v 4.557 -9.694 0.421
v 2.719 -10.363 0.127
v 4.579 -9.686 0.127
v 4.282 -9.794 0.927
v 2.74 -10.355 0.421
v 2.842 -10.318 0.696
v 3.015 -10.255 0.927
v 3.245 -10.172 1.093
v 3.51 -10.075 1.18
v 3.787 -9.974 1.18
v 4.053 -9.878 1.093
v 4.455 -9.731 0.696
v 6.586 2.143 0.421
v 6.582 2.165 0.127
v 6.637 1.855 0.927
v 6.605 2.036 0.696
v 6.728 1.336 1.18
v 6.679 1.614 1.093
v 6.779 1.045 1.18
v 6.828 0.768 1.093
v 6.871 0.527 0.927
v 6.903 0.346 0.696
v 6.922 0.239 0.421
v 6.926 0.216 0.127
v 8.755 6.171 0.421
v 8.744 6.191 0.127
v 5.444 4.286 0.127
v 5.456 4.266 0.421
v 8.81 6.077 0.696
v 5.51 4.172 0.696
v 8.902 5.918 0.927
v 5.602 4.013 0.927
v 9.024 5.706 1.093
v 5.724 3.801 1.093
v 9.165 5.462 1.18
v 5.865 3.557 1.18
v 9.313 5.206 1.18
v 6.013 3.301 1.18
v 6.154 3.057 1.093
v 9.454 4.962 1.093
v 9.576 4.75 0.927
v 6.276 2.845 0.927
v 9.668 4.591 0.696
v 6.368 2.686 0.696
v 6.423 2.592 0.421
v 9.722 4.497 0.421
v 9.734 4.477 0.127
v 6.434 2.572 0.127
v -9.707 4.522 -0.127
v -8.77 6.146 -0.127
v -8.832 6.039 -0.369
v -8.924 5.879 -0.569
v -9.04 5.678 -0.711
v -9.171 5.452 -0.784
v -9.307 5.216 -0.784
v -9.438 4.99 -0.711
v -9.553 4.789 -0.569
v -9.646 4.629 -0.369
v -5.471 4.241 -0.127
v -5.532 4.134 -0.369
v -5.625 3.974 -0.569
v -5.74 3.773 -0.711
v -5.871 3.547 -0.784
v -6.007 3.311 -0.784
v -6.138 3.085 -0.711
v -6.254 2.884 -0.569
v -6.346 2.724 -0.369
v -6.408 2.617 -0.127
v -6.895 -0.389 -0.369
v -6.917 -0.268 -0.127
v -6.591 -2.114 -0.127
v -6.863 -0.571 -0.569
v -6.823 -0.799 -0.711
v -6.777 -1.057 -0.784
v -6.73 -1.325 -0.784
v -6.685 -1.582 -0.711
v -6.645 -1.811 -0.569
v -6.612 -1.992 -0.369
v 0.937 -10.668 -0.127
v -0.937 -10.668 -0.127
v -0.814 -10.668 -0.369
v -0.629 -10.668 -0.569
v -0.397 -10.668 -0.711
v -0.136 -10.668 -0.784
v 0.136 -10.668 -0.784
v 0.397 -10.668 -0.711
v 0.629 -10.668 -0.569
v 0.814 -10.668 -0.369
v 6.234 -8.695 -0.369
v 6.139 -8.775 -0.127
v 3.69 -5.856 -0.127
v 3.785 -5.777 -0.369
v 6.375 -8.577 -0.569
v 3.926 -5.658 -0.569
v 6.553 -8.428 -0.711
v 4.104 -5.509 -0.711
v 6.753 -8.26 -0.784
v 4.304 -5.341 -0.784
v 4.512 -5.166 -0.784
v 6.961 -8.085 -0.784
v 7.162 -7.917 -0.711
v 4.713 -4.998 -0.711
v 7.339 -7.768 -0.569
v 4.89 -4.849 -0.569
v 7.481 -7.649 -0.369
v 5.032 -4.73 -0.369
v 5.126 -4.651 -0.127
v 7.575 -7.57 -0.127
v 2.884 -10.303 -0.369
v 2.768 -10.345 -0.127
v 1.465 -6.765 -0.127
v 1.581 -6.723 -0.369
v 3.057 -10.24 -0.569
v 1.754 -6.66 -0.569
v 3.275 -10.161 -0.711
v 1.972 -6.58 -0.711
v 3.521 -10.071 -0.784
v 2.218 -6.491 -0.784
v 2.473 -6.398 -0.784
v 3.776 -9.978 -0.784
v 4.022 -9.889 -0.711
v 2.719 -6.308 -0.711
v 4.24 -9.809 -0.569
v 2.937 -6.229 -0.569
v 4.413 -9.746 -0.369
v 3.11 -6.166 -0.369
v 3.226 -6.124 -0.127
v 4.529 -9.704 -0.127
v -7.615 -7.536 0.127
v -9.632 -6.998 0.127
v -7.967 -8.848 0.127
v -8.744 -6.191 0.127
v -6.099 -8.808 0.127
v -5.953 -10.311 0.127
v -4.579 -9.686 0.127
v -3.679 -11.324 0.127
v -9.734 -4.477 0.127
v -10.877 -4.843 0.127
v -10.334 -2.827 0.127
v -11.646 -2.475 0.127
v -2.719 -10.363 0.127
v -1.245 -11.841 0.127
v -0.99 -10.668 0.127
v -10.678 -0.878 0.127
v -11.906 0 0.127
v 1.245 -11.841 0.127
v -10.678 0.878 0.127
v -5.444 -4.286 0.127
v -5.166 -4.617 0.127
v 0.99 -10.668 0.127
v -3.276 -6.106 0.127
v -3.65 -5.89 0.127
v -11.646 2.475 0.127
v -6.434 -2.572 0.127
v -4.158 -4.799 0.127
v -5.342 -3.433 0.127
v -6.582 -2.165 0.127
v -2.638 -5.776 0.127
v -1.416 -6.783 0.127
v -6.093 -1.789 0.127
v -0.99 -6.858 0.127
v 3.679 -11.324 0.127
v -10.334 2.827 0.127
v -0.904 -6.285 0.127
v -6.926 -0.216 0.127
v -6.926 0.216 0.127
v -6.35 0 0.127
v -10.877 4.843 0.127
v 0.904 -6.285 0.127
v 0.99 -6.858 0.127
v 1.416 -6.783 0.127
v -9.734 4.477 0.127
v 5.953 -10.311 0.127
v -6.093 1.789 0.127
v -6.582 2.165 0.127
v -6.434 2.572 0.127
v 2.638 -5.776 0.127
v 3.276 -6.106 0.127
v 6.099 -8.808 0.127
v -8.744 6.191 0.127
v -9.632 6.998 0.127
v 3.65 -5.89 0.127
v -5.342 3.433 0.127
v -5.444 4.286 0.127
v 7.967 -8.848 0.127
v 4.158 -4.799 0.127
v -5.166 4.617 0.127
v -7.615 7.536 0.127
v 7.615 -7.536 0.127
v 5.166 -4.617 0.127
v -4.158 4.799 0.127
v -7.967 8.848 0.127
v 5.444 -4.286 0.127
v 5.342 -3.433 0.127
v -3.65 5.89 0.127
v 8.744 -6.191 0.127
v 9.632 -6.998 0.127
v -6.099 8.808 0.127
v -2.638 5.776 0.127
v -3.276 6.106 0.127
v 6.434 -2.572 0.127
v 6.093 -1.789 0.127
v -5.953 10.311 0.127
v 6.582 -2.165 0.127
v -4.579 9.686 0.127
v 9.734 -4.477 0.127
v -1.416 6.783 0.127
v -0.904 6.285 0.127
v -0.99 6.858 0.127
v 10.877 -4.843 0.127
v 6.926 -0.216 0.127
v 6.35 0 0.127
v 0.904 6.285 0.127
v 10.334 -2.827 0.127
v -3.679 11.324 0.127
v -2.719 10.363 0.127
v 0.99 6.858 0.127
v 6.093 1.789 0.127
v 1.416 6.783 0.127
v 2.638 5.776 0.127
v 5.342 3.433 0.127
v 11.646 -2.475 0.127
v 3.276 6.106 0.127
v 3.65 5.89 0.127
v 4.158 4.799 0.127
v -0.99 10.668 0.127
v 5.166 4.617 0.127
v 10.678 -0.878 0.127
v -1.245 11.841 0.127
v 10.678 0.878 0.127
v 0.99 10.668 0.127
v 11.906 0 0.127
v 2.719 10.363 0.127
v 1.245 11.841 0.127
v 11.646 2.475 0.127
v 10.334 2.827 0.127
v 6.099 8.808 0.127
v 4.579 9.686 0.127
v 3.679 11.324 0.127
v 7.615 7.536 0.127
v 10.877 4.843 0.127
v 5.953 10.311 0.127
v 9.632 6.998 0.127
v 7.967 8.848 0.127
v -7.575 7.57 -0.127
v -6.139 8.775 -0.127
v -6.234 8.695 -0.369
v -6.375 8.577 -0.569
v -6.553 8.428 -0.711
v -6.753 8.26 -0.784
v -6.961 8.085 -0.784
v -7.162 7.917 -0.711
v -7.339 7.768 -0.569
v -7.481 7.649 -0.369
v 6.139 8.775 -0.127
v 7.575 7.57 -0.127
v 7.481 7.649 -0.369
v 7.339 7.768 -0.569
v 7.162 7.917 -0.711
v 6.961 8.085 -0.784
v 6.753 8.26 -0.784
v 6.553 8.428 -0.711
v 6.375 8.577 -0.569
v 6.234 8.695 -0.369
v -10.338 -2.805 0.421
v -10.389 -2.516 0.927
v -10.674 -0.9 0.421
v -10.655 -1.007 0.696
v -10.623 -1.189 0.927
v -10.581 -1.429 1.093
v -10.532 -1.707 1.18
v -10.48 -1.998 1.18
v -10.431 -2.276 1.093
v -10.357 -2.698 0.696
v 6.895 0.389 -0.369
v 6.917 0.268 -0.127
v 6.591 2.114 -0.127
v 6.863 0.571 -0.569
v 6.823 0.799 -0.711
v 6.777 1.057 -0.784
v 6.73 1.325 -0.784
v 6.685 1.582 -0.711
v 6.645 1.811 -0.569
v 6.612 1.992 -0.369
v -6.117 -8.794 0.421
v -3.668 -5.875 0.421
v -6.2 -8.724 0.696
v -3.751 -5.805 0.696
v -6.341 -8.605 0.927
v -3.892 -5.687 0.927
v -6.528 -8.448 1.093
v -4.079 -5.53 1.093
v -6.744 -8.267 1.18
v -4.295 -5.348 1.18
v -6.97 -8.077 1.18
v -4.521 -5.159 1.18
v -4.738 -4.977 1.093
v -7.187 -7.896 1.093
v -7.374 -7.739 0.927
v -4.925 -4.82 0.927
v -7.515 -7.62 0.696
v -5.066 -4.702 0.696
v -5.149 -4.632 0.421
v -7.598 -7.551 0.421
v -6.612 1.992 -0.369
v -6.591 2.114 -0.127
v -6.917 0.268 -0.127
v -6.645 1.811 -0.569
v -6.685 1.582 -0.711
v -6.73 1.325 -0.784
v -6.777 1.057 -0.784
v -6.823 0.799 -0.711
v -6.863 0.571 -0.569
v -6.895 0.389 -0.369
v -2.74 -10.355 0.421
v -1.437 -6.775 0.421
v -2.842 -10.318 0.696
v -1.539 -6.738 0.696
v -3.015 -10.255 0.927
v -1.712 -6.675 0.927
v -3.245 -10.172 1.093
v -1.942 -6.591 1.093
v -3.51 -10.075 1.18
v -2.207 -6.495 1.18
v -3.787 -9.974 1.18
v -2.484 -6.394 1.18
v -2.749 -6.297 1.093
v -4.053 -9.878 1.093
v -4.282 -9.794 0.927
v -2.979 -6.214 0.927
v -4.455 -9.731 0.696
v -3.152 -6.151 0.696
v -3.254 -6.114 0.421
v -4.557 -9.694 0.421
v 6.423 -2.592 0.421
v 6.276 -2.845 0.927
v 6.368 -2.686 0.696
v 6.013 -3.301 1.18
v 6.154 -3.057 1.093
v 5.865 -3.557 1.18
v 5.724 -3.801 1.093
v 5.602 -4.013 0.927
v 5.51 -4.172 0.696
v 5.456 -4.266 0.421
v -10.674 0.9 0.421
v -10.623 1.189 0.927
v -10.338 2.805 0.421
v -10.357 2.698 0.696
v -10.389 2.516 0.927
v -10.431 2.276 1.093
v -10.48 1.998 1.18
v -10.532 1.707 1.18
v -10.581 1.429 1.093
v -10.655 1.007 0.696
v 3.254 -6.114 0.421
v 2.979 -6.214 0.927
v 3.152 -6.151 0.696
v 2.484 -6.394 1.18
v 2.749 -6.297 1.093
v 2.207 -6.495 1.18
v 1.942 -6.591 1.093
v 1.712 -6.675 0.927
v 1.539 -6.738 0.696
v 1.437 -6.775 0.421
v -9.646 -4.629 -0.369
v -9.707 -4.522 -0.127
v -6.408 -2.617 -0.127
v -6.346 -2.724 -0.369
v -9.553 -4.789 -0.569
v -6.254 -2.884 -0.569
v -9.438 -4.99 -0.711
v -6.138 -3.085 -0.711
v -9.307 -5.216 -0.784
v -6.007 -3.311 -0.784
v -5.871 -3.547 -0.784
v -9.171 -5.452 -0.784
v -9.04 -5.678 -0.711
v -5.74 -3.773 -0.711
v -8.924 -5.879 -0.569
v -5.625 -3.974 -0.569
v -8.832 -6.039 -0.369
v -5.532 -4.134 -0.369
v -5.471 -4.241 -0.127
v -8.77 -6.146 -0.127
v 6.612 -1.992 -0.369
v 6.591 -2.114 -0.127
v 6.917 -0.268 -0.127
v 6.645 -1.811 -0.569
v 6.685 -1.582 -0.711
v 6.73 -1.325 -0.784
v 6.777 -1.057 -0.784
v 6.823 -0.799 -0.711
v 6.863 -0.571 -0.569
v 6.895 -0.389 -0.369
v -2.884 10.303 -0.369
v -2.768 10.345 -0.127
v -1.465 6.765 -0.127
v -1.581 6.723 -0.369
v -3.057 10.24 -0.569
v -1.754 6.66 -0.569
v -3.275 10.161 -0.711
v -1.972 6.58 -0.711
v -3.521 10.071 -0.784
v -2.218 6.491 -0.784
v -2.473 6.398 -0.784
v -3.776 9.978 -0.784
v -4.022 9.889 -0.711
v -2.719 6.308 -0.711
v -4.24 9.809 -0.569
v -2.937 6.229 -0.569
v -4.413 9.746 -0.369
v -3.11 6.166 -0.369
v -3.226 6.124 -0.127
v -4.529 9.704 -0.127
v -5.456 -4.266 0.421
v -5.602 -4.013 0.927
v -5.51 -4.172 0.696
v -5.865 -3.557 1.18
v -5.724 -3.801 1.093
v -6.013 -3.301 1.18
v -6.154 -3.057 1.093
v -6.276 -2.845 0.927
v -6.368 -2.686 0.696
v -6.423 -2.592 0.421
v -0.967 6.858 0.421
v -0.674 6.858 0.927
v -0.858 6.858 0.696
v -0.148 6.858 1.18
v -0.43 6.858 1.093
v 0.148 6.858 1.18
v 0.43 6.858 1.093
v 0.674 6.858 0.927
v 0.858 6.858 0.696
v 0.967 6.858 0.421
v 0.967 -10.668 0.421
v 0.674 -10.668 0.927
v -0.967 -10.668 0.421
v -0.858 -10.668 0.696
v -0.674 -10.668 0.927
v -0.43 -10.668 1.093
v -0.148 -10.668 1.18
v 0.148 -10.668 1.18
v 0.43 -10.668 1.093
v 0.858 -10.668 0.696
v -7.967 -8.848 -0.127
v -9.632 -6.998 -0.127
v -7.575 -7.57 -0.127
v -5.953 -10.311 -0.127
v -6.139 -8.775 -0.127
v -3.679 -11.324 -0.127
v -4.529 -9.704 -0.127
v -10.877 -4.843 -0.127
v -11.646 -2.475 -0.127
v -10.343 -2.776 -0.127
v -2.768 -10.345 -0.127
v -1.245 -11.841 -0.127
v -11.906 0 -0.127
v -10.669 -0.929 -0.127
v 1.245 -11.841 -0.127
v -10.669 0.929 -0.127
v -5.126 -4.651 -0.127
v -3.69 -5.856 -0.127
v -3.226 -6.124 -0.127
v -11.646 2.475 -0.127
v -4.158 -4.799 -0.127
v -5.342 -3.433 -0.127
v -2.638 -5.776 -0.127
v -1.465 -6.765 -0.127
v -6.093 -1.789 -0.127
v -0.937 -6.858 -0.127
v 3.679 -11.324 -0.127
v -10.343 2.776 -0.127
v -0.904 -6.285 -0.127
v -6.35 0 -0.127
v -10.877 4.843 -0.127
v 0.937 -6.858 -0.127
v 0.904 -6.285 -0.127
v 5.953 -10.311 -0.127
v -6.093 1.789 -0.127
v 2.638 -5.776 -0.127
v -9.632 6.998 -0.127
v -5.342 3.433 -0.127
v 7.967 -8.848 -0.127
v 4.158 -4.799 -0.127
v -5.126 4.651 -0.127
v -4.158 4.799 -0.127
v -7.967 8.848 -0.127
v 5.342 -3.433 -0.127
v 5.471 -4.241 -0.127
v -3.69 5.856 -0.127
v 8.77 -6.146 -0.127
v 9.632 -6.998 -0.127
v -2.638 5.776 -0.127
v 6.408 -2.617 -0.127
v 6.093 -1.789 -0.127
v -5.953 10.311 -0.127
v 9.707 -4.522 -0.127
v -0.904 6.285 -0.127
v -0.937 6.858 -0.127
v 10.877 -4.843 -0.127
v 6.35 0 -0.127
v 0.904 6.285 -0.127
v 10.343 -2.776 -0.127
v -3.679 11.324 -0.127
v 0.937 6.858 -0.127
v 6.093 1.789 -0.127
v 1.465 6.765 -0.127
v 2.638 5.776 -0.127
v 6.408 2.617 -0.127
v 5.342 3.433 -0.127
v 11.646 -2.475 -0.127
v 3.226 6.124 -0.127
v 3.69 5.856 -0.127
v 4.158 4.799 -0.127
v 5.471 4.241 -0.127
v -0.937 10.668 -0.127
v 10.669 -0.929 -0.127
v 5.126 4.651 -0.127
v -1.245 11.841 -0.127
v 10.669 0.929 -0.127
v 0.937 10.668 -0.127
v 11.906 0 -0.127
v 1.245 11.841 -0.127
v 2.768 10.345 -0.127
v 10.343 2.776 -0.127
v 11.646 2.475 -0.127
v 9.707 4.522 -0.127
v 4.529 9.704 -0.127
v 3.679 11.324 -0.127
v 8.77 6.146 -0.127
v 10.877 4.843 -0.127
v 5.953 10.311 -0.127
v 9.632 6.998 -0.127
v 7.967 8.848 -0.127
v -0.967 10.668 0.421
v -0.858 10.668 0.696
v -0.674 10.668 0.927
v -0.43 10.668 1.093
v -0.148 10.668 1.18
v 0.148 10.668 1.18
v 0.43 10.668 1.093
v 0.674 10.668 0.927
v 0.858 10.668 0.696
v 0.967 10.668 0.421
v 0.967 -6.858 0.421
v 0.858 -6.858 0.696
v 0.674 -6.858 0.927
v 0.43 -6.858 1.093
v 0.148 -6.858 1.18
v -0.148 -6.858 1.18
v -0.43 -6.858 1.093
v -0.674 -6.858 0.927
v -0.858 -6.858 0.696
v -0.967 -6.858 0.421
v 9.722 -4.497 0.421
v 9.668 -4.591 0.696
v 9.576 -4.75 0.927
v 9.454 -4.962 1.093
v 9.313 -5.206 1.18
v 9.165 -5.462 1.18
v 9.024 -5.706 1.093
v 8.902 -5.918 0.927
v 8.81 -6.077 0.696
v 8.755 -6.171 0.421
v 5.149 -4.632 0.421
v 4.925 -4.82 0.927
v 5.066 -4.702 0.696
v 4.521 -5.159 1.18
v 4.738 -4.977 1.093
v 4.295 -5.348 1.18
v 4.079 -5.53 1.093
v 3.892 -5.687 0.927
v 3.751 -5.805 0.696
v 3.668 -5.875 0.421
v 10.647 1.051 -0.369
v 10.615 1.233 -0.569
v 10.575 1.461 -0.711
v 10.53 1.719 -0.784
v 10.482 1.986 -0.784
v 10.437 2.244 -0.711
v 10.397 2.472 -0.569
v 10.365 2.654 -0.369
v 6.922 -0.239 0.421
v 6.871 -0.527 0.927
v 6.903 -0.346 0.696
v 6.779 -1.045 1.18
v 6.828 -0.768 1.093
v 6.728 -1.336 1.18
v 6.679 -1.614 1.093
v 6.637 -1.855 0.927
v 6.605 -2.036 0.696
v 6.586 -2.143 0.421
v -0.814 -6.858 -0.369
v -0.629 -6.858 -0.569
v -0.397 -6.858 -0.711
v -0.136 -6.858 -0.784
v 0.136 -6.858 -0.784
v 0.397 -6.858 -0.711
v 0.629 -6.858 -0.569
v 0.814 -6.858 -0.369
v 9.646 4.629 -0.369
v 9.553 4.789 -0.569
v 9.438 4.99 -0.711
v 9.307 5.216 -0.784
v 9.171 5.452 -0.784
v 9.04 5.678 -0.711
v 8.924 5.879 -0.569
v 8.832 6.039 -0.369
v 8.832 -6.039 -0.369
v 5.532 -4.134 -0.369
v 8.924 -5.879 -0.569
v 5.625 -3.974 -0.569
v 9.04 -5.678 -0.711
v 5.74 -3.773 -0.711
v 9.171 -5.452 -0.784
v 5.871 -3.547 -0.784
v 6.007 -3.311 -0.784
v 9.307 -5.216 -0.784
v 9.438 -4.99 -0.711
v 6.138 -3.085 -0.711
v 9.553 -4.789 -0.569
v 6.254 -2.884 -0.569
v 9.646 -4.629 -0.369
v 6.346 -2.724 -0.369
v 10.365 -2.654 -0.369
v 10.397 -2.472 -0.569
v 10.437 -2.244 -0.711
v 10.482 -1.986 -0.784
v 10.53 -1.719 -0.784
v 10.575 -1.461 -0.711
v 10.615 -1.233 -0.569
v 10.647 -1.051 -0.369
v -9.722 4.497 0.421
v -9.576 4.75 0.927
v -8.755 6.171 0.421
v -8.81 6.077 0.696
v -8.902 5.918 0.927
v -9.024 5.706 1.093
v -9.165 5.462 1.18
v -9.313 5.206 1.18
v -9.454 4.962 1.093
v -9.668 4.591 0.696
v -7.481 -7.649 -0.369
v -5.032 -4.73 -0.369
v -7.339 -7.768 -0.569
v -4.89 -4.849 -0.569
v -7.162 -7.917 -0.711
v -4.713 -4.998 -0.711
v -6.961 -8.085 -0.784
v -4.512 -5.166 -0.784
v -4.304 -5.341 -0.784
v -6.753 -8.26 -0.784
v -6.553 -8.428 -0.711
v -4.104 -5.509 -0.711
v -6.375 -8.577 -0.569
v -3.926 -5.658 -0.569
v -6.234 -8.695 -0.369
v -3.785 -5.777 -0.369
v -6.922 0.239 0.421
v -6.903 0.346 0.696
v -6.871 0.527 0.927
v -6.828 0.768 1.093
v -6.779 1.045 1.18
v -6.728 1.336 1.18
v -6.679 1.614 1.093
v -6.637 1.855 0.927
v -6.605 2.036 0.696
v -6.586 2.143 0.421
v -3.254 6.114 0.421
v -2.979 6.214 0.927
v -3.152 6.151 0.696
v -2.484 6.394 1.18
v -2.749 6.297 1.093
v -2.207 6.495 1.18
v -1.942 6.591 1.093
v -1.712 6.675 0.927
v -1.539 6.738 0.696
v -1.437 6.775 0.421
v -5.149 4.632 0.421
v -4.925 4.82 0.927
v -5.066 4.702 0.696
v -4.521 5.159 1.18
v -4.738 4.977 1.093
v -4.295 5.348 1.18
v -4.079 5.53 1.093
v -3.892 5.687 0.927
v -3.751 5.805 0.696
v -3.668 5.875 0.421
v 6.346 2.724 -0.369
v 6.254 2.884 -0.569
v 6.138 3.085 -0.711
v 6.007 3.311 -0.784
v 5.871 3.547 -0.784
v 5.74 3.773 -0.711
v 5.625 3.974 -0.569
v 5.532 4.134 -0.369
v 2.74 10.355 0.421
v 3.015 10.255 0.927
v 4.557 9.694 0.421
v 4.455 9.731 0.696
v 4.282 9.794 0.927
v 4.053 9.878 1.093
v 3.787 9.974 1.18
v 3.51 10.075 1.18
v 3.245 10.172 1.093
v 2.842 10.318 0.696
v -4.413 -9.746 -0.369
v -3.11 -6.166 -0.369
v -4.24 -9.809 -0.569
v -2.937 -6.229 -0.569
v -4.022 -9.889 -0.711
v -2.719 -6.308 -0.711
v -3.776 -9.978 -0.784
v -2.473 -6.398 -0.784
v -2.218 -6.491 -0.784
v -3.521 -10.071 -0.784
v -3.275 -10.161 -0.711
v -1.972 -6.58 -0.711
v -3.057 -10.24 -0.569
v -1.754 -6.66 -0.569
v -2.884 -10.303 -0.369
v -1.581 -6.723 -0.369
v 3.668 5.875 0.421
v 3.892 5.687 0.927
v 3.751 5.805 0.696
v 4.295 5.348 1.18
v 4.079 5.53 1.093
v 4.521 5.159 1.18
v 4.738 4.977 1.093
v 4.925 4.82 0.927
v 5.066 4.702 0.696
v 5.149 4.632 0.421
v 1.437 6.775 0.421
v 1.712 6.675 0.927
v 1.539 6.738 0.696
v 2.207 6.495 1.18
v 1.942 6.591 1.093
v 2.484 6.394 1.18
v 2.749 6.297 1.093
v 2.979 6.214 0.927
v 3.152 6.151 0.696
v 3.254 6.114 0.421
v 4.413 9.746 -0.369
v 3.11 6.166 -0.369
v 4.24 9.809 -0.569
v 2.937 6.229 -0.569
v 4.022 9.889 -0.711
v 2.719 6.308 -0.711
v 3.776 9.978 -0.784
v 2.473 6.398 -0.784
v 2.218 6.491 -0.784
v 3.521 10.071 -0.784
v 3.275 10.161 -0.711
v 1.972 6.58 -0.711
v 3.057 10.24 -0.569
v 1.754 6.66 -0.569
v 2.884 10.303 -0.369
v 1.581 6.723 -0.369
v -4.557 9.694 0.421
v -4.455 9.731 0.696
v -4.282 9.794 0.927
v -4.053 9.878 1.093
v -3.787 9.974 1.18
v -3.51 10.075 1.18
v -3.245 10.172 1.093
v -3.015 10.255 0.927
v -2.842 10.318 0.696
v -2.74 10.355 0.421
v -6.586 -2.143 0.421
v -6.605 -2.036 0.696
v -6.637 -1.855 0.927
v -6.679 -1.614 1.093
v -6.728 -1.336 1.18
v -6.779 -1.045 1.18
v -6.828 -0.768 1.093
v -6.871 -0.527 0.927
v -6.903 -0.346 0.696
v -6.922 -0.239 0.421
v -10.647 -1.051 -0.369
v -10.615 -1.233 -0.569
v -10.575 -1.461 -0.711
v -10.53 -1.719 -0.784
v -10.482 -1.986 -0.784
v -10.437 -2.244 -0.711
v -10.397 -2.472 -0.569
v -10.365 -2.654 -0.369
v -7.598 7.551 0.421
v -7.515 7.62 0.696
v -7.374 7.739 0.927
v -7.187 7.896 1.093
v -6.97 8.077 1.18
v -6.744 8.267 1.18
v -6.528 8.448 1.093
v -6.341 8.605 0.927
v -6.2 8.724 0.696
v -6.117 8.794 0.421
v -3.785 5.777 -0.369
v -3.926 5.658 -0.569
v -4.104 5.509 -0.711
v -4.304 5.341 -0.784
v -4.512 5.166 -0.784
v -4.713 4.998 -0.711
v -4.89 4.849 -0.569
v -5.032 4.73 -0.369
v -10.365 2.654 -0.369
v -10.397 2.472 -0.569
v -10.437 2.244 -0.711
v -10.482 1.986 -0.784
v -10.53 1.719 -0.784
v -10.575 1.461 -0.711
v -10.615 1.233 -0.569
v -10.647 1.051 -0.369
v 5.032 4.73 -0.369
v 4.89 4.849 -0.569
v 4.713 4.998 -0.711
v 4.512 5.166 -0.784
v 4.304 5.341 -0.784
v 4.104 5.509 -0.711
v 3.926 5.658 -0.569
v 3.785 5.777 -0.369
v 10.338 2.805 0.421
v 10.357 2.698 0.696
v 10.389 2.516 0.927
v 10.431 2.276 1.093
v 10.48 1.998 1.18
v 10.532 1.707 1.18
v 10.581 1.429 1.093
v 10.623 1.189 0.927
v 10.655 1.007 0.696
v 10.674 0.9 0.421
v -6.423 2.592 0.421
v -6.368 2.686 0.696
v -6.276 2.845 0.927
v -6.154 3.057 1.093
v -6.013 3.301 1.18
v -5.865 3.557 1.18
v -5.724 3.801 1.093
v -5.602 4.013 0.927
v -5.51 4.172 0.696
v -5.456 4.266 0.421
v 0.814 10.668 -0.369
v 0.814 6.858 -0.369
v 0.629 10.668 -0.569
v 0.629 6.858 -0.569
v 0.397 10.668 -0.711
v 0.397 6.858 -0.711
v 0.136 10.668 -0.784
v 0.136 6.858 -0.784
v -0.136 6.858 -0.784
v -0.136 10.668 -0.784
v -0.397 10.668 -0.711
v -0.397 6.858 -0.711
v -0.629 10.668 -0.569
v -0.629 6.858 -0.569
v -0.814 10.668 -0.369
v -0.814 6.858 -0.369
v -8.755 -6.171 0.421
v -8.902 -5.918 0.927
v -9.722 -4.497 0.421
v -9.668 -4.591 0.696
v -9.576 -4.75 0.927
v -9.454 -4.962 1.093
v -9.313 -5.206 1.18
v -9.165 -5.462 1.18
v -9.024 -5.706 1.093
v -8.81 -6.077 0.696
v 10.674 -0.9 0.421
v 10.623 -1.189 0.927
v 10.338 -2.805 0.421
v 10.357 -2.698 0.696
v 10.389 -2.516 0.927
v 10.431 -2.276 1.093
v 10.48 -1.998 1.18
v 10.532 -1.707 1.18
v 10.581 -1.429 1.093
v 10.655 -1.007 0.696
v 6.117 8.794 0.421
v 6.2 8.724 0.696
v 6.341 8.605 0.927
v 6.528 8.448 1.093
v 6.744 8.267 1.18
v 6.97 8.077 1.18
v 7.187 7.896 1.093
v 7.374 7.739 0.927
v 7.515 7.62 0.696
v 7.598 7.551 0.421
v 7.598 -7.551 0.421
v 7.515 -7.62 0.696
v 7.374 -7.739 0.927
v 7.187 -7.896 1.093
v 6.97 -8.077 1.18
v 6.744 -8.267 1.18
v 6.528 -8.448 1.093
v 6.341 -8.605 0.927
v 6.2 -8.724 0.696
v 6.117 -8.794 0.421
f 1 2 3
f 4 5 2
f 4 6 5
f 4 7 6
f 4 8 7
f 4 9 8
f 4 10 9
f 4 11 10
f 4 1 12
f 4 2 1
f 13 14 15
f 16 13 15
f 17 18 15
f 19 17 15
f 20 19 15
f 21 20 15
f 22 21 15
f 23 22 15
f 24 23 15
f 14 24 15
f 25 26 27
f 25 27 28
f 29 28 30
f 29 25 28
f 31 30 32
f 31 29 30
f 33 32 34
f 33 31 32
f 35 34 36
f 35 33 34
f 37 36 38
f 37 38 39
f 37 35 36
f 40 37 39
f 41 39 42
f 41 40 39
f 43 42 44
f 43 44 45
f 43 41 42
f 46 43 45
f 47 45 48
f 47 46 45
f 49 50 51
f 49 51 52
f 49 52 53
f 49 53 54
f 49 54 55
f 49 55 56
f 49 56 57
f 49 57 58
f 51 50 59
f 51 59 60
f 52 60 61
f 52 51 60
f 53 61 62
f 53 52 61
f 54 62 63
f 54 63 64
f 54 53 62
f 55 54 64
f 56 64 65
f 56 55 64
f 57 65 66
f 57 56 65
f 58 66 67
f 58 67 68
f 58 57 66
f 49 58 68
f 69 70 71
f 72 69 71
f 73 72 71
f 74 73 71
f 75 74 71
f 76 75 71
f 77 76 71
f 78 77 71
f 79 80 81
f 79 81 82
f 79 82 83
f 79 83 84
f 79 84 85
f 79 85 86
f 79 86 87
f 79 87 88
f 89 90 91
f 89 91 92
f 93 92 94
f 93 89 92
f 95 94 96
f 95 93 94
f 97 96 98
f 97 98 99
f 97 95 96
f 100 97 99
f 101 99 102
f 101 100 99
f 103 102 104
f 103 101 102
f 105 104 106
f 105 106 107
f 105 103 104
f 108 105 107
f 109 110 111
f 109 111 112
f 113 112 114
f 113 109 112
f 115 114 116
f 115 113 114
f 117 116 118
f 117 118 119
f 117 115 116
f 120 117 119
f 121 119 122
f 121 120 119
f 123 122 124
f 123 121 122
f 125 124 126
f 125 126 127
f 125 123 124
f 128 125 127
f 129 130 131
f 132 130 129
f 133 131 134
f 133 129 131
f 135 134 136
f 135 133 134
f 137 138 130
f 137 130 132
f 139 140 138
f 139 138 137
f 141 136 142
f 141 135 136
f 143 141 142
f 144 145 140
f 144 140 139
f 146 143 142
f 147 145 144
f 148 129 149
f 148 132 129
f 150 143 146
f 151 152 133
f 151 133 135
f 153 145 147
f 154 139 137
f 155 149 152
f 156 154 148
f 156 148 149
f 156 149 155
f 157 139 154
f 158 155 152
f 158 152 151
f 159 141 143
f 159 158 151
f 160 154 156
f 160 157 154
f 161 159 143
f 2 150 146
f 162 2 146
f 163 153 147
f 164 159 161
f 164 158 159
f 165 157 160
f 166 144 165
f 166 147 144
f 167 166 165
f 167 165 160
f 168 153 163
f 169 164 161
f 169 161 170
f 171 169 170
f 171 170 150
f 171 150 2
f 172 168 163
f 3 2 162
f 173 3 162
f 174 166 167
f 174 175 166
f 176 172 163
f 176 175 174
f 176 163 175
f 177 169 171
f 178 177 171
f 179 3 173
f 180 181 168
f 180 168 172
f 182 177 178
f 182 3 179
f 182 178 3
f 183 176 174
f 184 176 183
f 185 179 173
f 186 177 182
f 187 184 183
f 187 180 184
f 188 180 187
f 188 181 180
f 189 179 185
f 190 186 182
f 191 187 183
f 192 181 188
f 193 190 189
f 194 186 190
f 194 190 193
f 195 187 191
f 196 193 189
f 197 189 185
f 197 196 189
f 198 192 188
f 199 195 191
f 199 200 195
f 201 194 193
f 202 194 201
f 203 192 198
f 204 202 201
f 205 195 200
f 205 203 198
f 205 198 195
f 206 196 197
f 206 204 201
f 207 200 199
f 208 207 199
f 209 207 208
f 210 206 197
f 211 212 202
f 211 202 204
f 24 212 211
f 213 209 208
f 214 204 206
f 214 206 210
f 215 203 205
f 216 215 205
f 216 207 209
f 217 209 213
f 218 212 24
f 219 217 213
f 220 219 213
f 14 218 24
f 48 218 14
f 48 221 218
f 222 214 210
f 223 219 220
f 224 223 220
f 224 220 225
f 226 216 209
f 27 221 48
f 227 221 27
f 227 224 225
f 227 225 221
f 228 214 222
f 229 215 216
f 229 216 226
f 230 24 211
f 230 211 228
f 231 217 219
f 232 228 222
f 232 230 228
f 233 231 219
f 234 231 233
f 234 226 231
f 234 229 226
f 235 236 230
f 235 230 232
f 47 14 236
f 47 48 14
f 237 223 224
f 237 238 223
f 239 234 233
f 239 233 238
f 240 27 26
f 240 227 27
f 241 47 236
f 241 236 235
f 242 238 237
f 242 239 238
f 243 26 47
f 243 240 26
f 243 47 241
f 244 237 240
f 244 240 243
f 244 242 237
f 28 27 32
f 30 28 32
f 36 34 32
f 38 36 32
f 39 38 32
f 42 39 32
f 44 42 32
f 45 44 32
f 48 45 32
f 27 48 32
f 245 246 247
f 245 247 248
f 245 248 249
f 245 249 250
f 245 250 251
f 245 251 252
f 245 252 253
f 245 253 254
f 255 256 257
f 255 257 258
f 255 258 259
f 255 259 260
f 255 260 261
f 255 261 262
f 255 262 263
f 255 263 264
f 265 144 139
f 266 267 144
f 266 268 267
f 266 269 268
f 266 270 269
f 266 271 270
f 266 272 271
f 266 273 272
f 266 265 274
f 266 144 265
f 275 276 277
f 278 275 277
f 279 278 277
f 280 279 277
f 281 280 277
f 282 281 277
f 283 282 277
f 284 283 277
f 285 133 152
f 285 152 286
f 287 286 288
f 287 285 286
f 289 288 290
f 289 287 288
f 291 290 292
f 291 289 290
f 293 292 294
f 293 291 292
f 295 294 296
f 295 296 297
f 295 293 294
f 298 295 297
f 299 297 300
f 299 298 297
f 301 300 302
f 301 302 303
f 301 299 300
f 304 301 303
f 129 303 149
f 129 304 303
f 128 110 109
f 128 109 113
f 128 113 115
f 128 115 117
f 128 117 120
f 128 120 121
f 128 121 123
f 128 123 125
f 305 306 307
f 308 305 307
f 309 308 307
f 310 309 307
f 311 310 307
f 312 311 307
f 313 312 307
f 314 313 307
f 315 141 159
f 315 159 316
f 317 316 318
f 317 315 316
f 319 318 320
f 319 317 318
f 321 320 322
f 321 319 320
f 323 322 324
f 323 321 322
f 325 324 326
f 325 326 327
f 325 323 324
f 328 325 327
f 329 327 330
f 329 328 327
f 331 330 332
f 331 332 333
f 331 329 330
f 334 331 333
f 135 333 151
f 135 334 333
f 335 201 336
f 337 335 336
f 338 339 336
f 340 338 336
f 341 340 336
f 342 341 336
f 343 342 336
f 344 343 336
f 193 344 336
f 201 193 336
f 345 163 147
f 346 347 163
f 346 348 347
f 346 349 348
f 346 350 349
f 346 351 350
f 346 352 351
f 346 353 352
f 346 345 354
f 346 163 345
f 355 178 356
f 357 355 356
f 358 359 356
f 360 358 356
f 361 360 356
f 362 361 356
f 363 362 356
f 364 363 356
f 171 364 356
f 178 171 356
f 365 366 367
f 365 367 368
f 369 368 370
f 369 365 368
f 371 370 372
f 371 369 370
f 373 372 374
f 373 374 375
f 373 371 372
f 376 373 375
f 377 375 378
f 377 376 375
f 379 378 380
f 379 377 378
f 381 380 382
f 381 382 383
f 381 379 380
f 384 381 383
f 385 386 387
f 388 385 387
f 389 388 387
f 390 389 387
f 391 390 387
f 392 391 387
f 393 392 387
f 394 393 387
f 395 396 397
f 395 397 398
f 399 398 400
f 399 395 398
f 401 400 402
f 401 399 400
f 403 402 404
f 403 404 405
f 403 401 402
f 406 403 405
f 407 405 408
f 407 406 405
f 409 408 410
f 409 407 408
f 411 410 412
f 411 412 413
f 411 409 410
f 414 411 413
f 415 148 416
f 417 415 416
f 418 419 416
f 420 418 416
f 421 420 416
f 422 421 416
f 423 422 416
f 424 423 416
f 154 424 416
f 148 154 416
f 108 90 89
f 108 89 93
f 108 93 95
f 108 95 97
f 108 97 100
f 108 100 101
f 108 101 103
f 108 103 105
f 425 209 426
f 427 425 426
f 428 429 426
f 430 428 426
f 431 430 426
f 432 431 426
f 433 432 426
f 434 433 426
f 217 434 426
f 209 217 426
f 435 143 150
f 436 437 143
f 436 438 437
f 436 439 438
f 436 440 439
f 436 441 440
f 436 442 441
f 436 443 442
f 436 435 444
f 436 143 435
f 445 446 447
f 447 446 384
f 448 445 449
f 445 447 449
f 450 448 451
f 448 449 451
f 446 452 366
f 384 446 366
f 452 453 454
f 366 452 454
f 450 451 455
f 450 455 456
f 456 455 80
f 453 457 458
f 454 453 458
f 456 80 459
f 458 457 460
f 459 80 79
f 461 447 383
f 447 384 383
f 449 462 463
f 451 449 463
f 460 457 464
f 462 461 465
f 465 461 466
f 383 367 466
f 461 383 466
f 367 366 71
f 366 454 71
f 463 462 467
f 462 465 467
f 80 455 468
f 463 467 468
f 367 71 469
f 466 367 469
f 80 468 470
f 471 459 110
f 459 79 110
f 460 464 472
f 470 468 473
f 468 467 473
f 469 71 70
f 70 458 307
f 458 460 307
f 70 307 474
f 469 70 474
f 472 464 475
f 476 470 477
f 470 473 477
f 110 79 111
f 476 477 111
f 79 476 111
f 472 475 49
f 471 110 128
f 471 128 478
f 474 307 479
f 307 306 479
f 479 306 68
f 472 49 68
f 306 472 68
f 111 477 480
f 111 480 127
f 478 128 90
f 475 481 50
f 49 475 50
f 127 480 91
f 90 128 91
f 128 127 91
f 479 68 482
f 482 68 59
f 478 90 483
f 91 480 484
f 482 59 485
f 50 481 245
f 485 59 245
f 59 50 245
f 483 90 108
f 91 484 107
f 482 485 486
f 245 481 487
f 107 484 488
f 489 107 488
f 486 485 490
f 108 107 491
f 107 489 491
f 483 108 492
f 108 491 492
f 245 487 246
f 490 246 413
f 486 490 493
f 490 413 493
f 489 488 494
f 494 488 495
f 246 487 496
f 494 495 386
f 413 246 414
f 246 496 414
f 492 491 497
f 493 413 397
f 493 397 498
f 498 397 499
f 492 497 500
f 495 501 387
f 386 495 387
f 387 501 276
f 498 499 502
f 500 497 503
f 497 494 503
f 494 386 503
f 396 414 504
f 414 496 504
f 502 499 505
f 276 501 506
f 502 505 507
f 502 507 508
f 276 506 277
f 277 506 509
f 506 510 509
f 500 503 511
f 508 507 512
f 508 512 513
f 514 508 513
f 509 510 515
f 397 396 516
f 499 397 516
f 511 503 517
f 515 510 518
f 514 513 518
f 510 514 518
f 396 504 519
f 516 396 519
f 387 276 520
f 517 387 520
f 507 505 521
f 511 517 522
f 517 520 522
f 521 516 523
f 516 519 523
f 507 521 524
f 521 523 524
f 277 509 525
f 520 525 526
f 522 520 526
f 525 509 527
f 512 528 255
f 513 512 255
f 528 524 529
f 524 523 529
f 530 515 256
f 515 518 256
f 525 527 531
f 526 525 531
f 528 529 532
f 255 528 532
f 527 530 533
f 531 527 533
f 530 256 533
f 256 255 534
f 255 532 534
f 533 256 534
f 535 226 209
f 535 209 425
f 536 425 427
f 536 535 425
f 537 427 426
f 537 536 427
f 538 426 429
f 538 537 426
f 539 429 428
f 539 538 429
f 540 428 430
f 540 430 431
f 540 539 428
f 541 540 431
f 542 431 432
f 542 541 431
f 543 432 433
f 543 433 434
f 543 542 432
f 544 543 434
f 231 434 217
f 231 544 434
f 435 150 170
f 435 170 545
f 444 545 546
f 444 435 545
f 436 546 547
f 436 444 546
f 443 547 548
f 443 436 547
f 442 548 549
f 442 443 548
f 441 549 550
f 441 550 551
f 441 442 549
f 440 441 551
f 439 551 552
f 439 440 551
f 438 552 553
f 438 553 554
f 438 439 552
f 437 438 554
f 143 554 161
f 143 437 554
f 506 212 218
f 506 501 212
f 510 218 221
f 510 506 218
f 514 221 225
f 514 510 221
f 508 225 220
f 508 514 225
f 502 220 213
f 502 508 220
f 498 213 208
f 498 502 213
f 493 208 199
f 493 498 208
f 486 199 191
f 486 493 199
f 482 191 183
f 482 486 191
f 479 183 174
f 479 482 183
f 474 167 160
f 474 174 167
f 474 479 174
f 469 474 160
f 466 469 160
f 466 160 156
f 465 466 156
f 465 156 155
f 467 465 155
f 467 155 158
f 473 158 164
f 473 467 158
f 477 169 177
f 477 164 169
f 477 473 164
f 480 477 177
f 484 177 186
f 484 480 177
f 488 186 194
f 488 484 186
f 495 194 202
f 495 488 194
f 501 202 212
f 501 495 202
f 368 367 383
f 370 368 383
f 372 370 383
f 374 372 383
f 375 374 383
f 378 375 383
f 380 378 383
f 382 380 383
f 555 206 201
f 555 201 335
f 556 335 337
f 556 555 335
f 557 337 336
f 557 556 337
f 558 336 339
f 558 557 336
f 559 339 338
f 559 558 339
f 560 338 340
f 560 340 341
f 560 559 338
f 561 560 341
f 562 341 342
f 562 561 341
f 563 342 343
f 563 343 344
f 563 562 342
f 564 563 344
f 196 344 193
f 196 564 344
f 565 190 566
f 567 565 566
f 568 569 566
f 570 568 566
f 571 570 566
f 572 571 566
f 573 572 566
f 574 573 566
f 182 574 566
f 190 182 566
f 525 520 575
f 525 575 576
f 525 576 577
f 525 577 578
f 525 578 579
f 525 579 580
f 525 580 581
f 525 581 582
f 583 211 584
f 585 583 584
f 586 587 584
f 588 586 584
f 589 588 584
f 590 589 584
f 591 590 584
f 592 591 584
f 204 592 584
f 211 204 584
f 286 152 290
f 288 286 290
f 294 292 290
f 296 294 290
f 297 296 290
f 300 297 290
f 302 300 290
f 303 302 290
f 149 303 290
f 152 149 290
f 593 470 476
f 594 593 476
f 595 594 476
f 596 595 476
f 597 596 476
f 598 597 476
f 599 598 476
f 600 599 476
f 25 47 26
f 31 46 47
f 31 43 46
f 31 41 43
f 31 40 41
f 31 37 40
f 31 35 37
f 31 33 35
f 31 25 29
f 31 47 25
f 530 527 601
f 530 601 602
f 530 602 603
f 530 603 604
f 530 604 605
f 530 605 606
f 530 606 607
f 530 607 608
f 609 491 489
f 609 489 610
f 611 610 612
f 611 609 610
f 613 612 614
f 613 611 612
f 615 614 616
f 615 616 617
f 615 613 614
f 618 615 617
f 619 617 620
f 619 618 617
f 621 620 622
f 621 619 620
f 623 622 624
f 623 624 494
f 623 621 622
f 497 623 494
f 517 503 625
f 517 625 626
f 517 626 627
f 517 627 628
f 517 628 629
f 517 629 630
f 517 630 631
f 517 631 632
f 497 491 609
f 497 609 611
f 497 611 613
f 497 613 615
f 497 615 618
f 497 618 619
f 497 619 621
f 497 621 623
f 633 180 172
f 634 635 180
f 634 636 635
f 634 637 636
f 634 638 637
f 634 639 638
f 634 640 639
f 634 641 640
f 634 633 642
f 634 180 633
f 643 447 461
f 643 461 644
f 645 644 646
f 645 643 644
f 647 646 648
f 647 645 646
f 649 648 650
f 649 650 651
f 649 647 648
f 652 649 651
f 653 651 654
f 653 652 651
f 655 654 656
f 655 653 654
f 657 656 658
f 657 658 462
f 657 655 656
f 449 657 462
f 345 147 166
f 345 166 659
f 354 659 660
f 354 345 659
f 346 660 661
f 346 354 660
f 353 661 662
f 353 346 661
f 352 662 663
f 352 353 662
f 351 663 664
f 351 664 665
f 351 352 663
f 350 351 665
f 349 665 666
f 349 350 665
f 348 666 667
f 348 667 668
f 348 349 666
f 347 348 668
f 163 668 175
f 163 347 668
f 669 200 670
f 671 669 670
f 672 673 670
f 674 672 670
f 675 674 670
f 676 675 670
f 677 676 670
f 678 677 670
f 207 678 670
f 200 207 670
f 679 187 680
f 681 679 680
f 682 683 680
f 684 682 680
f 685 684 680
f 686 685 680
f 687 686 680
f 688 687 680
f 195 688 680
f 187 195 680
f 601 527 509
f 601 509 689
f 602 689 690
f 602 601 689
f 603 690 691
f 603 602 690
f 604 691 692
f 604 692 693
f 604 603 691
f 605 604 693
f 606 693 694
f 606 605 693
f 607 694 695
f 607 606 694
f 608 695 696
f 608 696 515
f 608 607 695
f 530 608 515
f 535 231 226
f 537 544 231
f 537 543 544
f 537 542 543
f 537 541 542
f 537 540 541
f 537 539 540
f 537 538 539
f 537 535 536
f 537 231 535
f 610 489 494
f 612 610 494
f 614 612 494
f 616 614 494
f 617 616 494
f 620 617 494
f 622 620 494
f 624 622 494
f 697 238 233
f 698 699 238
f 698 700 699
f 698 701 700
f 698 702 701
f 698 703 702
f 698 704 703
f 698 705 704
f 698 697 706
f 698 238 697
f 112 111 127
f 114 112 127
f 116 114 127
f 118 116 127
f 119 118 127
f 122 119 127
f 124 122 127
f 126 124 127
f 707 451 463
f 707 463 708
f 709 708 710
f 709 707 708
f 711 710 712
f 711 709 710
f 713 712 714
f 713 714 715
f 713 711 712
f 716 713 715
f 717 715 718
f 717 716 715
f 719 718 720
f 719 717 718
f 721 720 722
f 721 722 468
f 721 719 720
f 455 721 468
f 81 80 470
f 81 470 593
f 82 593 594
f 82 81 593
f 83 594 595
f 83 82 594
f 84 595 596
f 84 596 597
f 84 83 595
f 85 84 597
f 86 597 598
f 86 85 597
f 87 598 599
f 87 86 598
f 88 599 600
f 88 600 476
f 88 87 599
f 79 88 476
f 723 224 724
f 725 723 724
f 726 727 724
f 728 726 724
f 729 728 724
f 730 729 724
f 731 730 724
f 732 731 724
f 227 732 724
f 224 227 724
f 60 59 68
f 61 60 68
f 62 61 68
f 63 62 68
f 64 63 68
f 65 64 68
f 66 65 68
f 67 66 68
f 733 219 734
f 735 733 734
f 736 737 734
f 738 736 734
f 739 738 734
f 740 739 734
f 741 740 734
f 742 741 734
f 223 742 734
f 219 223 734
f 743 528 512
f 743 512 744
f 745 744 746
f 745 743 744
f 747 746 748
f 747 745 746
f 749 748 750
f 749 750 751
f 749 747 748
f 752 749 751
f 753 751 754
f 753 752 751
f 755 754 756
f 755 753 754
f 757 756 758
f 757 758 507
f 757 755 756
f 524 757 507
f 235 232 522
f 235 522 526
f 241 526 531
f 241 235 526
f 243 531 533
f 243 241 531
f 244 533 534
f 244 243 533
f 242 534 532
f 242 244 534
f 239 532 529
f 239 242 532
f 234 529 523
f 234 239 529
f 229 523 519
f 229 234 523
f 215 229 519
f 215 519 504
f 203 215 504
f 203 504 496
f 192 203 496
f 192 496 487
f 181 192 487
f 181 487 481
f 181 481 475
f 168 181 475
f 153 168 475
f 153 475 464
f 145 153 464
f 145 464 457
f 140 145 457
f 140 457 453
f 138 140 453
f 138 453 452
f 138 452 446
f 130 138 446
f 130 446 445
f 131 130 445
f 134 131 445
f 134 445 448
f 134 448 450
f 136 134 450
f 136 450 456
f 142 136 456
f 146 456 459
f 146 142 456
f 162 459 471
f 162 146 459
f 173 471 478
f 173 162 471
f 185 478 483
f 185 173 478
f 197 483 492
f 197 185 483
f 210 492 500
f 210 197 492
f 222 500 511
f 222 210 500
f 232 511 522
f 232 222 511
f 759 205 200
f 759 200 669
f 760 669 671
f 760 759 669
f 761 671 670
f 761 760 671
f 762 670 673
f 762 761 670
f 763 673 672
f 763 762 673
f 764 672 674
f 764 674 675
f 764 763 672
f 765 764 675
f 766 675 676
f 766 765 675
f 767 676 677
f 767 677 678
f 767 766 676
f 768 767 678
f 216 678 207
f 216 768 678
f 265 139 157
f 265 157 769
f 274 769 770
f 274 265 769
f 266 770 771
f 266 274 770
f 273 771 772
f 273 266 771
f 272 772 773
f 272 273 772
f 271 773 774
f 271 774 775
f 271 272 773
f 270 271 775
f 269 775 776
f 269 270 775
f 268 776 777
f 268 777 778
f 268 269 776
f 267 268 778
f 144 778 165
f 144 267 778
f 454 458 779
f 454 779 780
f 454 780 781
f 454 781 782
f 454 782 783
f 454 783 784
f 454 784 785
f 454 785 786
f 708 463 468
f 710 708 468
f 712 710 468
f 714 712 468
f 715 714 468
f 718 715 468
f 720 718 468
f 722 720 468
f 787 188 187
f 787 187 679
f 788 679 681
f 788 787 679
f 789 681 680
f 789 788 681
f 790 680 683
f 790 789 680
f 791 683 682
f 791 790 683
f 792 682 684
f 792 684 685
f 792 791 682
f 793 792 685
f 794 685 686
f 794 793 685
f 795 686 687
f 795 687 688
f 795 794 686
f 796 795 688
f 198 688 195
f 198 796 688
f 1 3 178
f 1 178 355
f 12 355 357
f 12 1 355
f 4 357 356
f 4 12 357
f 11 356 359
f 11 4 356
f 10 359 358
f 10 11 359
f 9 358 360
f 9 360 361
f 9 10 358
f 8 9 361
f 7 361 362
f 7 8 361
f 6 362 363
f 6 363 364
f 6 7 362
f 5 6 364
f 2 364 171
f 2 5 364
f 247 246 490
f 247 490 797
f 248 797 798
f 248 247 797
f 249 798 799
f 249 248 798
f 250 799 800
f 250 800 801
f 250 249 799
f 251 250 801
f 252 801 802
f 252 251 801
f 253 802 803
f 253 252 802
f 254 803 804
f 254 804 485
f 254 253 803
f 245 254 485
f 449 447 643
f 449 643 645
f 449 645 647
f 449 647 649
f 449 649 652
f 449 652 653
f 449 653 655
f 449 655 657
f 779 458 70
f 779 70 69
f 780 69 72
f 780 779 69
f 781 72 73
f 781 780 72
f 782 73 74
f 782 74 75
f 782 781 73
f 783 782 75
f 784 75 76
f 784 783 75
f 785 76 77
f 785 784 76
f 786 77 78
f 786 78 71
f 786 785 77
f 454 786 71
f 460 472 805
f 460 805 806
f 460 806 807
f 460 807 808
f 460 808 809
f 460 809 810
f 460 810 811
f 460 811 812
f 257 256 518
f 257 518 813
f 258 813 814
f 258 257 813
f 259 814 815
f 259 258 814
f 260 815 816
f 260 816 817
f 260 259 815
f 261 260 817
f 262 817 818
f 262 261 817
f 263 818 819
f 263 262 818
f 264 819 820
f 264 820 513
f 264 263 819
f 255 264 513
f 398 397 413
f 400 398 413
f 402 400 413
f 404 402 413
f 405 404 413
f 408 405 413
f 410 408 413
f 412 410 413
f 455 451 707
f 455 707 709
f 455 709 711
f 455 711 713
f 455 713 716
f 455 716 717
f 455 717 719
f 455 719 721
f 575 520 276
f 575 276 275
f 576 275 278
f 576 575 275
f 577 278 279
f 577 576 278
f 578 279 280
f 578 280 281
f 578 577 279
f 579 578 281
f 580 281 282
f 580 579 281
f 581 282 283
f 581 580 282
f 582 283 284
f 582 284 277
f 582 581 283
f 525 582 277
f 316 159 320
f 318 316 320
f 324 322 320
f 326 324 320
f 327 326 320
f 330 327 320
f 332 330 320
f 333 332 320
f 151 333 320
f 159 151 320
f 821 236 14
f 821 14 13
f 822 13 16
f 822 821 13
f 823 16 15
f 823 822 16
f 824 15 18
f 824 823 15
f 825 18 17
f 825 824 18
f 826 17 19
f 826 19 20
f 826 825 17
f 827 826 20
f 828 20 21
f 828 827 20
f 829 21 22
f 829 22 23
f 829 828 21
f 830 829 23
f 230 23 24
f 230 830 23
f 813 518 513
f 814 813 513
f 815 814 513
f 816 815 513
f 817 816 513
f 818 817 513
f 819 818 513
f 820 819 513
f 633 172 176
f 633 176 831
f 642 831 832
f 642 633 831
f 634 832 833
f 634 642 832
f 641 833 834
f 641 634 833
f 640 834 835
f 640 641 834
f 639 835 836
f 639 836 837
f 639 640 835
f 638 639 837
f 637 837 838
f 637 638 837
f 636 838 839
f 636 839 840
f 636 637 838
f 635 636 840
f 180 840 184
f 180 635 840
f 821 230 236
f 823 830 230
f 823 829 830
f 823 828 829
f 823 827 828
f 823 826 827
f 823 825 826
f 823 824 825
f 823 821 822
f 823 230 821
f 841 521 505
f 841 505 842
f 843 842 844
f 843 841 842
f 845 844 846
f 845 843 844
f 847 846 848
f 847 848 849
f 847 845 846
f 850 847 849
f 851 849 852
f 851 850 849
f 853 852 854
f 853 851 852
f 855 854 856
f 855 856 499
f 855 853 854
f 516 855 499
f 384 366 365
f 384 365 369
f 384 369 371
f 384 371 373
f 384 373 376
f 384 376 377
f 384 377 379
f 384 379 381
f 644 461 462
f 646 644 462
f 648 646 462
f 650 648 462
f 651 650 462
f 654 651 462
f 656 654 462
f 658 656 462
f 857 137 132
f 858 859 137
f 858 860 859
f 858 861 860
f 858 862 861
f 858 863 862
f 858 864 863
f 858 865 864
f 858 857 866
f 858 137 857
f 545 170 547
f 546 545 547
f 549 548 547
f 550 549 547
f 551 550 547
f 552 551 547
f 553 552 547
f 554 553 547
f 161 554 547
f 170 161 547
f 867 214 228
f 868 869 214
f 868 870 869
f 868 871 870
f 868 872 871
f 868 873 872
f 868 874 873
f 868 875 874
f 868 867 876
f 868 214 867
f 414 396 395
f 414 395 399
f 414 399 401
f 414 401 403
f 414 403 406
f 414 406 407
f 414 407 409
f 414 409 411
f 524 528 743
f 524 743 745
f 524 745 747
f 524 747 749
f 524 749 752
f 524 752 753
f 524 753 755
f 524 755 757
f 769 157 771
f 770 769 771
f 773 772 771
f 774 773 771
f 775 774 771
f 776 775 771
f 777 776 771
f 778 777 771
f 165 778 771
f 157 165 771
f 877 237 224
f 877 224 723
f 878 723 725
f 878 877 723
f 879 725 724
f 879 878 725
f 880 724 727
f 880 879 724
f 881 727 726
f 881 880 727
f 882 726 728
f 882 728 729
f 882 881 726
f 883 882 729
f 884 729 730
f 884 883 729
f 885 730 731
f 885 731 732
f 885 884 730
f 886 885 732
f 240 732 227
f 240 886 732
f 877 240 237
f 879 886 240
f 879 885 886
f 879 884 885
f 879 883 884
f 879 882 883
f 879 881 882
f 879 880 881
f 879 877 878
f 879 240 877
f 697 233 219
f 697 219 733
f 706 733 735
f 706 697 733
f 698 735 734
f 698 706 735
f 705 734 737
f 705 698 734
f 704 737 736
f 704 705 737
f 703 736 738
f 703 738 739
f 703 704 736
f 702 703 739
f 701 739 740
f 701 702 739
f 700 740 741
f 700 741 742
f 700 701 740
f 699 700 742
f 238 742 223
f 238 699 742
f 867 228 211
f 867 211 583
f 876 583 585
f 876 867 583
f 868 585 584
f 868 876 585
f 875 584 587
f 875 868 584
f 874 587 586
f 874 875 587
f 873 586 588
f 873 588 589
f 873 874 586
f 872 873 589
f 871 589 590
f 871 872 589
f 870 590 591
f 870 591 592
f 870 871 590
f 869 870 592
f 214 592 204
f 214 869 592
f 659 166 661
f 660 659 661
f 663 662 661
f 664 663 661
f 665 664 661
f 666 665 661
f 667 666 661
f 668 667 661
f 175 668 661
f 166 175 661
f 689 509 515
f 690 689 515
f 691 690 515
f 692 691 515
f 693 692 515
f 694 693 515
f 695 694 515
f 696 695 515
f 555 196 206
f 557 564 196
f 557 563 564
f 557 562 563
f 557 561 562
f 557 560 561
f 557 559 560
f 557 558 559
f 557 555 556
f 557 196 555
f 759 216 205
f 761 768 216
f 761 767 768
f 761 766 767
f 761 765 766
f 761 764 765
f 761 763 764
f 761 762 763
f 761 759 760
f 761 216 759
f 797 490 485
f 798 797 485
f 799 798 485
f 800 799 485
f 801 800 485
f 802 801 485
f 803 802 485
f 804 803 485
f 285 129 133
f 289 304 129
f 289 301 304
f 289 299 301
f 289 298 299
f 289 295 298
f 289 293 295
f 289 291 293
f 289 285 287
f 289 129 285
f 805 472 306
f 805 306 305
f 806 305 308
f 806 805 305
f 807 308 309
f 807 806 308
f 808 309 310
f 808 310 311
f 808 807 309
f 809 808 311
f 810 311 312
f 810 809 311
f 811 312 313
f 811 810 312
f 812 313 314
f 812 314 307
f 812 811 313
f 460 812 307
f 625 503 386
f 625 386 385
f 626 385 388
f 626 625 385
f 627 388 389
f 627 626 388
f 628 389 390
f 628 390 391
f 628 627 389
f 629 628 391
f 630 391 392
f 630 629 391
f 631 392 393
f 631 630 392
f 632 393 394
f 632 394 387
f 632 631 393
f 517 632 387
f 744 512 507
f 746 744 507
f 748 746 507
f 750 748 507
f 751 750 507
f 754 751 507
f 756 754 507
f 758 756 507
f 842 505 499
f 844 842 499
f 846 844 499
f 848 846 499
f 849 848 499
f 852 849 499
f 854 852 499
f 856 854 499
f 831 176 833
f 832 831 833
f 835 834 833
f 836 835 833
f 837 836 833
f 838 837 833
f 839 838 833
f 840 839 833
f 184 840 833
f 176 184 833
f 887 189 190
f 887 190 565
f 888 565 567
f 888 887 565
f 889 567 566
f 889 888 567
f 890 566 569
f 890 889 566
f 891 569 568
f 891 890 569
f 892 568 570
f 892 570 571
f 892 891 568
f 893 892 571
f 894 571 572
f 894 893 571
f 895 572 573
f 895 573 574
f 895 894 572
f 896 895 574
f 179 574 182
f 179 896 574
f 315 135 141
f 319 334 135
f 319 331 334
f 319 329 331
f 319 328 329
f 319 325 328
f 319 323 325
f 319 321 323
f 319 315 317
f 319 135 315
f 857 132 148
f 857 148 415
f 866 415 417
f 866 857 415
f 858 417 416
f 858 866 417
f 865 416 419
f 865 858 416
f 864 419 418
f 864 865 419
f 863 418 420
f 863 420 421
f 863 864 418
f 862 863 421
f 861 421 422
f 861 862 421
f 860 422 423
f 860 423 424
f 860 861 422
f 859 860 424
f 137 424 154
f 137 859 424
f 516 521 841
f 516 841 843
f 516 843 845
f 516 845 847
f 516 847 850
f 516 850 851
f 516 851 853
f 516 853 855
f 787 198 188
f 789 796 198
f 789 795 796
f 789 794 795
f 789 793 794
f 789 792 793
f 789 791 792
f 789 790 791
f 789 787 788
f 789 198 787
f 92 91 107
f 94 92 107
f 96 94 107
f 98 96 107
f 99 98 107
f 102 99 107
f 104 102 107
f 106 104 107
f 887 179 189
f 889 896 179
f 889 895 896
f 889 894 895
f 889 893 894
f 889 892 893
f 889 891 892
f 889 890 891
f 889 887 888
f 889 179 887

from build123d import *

# Parameters (mm, degrees)
F0_R     = 11.90625
F0_R_2   = 6.35
F1_DEPTH = 0.127
F3_R     = 0.9921875
F4_DEPTH = 3.81
F5_COUNT = 18


with BuildPart() as f1:
    # F0 (on Top) → F1 (new body, symmetric)
    with BuildSketch(Plane.XY):
        Circle(F0_R)
        Circle(F0_R_2, mode=Mode.SUBTRACT)
    extrude(amount=F1_DEPTH, both=True)

    # F3 (on offset) → F4 (join)
    with BuildSketch(Plane.XZ.offset(10.668)):
        with Locations((0, 0.1984869643)):
            Circle(F3_R)
    extrude(amount=-F4_DEPTH)

    # F5: F1 ×18 about axis
    f5_axis = Axis((0, 0, 0), (0, 0, -1))


with BuildPart() as f1_1:
    add(f1.part)
    for i in range(1, F5_COUNT):
        add(f1.part.rotate(f5_axis, i * 360 / F5_COUNT))


solid = f1_1.part
